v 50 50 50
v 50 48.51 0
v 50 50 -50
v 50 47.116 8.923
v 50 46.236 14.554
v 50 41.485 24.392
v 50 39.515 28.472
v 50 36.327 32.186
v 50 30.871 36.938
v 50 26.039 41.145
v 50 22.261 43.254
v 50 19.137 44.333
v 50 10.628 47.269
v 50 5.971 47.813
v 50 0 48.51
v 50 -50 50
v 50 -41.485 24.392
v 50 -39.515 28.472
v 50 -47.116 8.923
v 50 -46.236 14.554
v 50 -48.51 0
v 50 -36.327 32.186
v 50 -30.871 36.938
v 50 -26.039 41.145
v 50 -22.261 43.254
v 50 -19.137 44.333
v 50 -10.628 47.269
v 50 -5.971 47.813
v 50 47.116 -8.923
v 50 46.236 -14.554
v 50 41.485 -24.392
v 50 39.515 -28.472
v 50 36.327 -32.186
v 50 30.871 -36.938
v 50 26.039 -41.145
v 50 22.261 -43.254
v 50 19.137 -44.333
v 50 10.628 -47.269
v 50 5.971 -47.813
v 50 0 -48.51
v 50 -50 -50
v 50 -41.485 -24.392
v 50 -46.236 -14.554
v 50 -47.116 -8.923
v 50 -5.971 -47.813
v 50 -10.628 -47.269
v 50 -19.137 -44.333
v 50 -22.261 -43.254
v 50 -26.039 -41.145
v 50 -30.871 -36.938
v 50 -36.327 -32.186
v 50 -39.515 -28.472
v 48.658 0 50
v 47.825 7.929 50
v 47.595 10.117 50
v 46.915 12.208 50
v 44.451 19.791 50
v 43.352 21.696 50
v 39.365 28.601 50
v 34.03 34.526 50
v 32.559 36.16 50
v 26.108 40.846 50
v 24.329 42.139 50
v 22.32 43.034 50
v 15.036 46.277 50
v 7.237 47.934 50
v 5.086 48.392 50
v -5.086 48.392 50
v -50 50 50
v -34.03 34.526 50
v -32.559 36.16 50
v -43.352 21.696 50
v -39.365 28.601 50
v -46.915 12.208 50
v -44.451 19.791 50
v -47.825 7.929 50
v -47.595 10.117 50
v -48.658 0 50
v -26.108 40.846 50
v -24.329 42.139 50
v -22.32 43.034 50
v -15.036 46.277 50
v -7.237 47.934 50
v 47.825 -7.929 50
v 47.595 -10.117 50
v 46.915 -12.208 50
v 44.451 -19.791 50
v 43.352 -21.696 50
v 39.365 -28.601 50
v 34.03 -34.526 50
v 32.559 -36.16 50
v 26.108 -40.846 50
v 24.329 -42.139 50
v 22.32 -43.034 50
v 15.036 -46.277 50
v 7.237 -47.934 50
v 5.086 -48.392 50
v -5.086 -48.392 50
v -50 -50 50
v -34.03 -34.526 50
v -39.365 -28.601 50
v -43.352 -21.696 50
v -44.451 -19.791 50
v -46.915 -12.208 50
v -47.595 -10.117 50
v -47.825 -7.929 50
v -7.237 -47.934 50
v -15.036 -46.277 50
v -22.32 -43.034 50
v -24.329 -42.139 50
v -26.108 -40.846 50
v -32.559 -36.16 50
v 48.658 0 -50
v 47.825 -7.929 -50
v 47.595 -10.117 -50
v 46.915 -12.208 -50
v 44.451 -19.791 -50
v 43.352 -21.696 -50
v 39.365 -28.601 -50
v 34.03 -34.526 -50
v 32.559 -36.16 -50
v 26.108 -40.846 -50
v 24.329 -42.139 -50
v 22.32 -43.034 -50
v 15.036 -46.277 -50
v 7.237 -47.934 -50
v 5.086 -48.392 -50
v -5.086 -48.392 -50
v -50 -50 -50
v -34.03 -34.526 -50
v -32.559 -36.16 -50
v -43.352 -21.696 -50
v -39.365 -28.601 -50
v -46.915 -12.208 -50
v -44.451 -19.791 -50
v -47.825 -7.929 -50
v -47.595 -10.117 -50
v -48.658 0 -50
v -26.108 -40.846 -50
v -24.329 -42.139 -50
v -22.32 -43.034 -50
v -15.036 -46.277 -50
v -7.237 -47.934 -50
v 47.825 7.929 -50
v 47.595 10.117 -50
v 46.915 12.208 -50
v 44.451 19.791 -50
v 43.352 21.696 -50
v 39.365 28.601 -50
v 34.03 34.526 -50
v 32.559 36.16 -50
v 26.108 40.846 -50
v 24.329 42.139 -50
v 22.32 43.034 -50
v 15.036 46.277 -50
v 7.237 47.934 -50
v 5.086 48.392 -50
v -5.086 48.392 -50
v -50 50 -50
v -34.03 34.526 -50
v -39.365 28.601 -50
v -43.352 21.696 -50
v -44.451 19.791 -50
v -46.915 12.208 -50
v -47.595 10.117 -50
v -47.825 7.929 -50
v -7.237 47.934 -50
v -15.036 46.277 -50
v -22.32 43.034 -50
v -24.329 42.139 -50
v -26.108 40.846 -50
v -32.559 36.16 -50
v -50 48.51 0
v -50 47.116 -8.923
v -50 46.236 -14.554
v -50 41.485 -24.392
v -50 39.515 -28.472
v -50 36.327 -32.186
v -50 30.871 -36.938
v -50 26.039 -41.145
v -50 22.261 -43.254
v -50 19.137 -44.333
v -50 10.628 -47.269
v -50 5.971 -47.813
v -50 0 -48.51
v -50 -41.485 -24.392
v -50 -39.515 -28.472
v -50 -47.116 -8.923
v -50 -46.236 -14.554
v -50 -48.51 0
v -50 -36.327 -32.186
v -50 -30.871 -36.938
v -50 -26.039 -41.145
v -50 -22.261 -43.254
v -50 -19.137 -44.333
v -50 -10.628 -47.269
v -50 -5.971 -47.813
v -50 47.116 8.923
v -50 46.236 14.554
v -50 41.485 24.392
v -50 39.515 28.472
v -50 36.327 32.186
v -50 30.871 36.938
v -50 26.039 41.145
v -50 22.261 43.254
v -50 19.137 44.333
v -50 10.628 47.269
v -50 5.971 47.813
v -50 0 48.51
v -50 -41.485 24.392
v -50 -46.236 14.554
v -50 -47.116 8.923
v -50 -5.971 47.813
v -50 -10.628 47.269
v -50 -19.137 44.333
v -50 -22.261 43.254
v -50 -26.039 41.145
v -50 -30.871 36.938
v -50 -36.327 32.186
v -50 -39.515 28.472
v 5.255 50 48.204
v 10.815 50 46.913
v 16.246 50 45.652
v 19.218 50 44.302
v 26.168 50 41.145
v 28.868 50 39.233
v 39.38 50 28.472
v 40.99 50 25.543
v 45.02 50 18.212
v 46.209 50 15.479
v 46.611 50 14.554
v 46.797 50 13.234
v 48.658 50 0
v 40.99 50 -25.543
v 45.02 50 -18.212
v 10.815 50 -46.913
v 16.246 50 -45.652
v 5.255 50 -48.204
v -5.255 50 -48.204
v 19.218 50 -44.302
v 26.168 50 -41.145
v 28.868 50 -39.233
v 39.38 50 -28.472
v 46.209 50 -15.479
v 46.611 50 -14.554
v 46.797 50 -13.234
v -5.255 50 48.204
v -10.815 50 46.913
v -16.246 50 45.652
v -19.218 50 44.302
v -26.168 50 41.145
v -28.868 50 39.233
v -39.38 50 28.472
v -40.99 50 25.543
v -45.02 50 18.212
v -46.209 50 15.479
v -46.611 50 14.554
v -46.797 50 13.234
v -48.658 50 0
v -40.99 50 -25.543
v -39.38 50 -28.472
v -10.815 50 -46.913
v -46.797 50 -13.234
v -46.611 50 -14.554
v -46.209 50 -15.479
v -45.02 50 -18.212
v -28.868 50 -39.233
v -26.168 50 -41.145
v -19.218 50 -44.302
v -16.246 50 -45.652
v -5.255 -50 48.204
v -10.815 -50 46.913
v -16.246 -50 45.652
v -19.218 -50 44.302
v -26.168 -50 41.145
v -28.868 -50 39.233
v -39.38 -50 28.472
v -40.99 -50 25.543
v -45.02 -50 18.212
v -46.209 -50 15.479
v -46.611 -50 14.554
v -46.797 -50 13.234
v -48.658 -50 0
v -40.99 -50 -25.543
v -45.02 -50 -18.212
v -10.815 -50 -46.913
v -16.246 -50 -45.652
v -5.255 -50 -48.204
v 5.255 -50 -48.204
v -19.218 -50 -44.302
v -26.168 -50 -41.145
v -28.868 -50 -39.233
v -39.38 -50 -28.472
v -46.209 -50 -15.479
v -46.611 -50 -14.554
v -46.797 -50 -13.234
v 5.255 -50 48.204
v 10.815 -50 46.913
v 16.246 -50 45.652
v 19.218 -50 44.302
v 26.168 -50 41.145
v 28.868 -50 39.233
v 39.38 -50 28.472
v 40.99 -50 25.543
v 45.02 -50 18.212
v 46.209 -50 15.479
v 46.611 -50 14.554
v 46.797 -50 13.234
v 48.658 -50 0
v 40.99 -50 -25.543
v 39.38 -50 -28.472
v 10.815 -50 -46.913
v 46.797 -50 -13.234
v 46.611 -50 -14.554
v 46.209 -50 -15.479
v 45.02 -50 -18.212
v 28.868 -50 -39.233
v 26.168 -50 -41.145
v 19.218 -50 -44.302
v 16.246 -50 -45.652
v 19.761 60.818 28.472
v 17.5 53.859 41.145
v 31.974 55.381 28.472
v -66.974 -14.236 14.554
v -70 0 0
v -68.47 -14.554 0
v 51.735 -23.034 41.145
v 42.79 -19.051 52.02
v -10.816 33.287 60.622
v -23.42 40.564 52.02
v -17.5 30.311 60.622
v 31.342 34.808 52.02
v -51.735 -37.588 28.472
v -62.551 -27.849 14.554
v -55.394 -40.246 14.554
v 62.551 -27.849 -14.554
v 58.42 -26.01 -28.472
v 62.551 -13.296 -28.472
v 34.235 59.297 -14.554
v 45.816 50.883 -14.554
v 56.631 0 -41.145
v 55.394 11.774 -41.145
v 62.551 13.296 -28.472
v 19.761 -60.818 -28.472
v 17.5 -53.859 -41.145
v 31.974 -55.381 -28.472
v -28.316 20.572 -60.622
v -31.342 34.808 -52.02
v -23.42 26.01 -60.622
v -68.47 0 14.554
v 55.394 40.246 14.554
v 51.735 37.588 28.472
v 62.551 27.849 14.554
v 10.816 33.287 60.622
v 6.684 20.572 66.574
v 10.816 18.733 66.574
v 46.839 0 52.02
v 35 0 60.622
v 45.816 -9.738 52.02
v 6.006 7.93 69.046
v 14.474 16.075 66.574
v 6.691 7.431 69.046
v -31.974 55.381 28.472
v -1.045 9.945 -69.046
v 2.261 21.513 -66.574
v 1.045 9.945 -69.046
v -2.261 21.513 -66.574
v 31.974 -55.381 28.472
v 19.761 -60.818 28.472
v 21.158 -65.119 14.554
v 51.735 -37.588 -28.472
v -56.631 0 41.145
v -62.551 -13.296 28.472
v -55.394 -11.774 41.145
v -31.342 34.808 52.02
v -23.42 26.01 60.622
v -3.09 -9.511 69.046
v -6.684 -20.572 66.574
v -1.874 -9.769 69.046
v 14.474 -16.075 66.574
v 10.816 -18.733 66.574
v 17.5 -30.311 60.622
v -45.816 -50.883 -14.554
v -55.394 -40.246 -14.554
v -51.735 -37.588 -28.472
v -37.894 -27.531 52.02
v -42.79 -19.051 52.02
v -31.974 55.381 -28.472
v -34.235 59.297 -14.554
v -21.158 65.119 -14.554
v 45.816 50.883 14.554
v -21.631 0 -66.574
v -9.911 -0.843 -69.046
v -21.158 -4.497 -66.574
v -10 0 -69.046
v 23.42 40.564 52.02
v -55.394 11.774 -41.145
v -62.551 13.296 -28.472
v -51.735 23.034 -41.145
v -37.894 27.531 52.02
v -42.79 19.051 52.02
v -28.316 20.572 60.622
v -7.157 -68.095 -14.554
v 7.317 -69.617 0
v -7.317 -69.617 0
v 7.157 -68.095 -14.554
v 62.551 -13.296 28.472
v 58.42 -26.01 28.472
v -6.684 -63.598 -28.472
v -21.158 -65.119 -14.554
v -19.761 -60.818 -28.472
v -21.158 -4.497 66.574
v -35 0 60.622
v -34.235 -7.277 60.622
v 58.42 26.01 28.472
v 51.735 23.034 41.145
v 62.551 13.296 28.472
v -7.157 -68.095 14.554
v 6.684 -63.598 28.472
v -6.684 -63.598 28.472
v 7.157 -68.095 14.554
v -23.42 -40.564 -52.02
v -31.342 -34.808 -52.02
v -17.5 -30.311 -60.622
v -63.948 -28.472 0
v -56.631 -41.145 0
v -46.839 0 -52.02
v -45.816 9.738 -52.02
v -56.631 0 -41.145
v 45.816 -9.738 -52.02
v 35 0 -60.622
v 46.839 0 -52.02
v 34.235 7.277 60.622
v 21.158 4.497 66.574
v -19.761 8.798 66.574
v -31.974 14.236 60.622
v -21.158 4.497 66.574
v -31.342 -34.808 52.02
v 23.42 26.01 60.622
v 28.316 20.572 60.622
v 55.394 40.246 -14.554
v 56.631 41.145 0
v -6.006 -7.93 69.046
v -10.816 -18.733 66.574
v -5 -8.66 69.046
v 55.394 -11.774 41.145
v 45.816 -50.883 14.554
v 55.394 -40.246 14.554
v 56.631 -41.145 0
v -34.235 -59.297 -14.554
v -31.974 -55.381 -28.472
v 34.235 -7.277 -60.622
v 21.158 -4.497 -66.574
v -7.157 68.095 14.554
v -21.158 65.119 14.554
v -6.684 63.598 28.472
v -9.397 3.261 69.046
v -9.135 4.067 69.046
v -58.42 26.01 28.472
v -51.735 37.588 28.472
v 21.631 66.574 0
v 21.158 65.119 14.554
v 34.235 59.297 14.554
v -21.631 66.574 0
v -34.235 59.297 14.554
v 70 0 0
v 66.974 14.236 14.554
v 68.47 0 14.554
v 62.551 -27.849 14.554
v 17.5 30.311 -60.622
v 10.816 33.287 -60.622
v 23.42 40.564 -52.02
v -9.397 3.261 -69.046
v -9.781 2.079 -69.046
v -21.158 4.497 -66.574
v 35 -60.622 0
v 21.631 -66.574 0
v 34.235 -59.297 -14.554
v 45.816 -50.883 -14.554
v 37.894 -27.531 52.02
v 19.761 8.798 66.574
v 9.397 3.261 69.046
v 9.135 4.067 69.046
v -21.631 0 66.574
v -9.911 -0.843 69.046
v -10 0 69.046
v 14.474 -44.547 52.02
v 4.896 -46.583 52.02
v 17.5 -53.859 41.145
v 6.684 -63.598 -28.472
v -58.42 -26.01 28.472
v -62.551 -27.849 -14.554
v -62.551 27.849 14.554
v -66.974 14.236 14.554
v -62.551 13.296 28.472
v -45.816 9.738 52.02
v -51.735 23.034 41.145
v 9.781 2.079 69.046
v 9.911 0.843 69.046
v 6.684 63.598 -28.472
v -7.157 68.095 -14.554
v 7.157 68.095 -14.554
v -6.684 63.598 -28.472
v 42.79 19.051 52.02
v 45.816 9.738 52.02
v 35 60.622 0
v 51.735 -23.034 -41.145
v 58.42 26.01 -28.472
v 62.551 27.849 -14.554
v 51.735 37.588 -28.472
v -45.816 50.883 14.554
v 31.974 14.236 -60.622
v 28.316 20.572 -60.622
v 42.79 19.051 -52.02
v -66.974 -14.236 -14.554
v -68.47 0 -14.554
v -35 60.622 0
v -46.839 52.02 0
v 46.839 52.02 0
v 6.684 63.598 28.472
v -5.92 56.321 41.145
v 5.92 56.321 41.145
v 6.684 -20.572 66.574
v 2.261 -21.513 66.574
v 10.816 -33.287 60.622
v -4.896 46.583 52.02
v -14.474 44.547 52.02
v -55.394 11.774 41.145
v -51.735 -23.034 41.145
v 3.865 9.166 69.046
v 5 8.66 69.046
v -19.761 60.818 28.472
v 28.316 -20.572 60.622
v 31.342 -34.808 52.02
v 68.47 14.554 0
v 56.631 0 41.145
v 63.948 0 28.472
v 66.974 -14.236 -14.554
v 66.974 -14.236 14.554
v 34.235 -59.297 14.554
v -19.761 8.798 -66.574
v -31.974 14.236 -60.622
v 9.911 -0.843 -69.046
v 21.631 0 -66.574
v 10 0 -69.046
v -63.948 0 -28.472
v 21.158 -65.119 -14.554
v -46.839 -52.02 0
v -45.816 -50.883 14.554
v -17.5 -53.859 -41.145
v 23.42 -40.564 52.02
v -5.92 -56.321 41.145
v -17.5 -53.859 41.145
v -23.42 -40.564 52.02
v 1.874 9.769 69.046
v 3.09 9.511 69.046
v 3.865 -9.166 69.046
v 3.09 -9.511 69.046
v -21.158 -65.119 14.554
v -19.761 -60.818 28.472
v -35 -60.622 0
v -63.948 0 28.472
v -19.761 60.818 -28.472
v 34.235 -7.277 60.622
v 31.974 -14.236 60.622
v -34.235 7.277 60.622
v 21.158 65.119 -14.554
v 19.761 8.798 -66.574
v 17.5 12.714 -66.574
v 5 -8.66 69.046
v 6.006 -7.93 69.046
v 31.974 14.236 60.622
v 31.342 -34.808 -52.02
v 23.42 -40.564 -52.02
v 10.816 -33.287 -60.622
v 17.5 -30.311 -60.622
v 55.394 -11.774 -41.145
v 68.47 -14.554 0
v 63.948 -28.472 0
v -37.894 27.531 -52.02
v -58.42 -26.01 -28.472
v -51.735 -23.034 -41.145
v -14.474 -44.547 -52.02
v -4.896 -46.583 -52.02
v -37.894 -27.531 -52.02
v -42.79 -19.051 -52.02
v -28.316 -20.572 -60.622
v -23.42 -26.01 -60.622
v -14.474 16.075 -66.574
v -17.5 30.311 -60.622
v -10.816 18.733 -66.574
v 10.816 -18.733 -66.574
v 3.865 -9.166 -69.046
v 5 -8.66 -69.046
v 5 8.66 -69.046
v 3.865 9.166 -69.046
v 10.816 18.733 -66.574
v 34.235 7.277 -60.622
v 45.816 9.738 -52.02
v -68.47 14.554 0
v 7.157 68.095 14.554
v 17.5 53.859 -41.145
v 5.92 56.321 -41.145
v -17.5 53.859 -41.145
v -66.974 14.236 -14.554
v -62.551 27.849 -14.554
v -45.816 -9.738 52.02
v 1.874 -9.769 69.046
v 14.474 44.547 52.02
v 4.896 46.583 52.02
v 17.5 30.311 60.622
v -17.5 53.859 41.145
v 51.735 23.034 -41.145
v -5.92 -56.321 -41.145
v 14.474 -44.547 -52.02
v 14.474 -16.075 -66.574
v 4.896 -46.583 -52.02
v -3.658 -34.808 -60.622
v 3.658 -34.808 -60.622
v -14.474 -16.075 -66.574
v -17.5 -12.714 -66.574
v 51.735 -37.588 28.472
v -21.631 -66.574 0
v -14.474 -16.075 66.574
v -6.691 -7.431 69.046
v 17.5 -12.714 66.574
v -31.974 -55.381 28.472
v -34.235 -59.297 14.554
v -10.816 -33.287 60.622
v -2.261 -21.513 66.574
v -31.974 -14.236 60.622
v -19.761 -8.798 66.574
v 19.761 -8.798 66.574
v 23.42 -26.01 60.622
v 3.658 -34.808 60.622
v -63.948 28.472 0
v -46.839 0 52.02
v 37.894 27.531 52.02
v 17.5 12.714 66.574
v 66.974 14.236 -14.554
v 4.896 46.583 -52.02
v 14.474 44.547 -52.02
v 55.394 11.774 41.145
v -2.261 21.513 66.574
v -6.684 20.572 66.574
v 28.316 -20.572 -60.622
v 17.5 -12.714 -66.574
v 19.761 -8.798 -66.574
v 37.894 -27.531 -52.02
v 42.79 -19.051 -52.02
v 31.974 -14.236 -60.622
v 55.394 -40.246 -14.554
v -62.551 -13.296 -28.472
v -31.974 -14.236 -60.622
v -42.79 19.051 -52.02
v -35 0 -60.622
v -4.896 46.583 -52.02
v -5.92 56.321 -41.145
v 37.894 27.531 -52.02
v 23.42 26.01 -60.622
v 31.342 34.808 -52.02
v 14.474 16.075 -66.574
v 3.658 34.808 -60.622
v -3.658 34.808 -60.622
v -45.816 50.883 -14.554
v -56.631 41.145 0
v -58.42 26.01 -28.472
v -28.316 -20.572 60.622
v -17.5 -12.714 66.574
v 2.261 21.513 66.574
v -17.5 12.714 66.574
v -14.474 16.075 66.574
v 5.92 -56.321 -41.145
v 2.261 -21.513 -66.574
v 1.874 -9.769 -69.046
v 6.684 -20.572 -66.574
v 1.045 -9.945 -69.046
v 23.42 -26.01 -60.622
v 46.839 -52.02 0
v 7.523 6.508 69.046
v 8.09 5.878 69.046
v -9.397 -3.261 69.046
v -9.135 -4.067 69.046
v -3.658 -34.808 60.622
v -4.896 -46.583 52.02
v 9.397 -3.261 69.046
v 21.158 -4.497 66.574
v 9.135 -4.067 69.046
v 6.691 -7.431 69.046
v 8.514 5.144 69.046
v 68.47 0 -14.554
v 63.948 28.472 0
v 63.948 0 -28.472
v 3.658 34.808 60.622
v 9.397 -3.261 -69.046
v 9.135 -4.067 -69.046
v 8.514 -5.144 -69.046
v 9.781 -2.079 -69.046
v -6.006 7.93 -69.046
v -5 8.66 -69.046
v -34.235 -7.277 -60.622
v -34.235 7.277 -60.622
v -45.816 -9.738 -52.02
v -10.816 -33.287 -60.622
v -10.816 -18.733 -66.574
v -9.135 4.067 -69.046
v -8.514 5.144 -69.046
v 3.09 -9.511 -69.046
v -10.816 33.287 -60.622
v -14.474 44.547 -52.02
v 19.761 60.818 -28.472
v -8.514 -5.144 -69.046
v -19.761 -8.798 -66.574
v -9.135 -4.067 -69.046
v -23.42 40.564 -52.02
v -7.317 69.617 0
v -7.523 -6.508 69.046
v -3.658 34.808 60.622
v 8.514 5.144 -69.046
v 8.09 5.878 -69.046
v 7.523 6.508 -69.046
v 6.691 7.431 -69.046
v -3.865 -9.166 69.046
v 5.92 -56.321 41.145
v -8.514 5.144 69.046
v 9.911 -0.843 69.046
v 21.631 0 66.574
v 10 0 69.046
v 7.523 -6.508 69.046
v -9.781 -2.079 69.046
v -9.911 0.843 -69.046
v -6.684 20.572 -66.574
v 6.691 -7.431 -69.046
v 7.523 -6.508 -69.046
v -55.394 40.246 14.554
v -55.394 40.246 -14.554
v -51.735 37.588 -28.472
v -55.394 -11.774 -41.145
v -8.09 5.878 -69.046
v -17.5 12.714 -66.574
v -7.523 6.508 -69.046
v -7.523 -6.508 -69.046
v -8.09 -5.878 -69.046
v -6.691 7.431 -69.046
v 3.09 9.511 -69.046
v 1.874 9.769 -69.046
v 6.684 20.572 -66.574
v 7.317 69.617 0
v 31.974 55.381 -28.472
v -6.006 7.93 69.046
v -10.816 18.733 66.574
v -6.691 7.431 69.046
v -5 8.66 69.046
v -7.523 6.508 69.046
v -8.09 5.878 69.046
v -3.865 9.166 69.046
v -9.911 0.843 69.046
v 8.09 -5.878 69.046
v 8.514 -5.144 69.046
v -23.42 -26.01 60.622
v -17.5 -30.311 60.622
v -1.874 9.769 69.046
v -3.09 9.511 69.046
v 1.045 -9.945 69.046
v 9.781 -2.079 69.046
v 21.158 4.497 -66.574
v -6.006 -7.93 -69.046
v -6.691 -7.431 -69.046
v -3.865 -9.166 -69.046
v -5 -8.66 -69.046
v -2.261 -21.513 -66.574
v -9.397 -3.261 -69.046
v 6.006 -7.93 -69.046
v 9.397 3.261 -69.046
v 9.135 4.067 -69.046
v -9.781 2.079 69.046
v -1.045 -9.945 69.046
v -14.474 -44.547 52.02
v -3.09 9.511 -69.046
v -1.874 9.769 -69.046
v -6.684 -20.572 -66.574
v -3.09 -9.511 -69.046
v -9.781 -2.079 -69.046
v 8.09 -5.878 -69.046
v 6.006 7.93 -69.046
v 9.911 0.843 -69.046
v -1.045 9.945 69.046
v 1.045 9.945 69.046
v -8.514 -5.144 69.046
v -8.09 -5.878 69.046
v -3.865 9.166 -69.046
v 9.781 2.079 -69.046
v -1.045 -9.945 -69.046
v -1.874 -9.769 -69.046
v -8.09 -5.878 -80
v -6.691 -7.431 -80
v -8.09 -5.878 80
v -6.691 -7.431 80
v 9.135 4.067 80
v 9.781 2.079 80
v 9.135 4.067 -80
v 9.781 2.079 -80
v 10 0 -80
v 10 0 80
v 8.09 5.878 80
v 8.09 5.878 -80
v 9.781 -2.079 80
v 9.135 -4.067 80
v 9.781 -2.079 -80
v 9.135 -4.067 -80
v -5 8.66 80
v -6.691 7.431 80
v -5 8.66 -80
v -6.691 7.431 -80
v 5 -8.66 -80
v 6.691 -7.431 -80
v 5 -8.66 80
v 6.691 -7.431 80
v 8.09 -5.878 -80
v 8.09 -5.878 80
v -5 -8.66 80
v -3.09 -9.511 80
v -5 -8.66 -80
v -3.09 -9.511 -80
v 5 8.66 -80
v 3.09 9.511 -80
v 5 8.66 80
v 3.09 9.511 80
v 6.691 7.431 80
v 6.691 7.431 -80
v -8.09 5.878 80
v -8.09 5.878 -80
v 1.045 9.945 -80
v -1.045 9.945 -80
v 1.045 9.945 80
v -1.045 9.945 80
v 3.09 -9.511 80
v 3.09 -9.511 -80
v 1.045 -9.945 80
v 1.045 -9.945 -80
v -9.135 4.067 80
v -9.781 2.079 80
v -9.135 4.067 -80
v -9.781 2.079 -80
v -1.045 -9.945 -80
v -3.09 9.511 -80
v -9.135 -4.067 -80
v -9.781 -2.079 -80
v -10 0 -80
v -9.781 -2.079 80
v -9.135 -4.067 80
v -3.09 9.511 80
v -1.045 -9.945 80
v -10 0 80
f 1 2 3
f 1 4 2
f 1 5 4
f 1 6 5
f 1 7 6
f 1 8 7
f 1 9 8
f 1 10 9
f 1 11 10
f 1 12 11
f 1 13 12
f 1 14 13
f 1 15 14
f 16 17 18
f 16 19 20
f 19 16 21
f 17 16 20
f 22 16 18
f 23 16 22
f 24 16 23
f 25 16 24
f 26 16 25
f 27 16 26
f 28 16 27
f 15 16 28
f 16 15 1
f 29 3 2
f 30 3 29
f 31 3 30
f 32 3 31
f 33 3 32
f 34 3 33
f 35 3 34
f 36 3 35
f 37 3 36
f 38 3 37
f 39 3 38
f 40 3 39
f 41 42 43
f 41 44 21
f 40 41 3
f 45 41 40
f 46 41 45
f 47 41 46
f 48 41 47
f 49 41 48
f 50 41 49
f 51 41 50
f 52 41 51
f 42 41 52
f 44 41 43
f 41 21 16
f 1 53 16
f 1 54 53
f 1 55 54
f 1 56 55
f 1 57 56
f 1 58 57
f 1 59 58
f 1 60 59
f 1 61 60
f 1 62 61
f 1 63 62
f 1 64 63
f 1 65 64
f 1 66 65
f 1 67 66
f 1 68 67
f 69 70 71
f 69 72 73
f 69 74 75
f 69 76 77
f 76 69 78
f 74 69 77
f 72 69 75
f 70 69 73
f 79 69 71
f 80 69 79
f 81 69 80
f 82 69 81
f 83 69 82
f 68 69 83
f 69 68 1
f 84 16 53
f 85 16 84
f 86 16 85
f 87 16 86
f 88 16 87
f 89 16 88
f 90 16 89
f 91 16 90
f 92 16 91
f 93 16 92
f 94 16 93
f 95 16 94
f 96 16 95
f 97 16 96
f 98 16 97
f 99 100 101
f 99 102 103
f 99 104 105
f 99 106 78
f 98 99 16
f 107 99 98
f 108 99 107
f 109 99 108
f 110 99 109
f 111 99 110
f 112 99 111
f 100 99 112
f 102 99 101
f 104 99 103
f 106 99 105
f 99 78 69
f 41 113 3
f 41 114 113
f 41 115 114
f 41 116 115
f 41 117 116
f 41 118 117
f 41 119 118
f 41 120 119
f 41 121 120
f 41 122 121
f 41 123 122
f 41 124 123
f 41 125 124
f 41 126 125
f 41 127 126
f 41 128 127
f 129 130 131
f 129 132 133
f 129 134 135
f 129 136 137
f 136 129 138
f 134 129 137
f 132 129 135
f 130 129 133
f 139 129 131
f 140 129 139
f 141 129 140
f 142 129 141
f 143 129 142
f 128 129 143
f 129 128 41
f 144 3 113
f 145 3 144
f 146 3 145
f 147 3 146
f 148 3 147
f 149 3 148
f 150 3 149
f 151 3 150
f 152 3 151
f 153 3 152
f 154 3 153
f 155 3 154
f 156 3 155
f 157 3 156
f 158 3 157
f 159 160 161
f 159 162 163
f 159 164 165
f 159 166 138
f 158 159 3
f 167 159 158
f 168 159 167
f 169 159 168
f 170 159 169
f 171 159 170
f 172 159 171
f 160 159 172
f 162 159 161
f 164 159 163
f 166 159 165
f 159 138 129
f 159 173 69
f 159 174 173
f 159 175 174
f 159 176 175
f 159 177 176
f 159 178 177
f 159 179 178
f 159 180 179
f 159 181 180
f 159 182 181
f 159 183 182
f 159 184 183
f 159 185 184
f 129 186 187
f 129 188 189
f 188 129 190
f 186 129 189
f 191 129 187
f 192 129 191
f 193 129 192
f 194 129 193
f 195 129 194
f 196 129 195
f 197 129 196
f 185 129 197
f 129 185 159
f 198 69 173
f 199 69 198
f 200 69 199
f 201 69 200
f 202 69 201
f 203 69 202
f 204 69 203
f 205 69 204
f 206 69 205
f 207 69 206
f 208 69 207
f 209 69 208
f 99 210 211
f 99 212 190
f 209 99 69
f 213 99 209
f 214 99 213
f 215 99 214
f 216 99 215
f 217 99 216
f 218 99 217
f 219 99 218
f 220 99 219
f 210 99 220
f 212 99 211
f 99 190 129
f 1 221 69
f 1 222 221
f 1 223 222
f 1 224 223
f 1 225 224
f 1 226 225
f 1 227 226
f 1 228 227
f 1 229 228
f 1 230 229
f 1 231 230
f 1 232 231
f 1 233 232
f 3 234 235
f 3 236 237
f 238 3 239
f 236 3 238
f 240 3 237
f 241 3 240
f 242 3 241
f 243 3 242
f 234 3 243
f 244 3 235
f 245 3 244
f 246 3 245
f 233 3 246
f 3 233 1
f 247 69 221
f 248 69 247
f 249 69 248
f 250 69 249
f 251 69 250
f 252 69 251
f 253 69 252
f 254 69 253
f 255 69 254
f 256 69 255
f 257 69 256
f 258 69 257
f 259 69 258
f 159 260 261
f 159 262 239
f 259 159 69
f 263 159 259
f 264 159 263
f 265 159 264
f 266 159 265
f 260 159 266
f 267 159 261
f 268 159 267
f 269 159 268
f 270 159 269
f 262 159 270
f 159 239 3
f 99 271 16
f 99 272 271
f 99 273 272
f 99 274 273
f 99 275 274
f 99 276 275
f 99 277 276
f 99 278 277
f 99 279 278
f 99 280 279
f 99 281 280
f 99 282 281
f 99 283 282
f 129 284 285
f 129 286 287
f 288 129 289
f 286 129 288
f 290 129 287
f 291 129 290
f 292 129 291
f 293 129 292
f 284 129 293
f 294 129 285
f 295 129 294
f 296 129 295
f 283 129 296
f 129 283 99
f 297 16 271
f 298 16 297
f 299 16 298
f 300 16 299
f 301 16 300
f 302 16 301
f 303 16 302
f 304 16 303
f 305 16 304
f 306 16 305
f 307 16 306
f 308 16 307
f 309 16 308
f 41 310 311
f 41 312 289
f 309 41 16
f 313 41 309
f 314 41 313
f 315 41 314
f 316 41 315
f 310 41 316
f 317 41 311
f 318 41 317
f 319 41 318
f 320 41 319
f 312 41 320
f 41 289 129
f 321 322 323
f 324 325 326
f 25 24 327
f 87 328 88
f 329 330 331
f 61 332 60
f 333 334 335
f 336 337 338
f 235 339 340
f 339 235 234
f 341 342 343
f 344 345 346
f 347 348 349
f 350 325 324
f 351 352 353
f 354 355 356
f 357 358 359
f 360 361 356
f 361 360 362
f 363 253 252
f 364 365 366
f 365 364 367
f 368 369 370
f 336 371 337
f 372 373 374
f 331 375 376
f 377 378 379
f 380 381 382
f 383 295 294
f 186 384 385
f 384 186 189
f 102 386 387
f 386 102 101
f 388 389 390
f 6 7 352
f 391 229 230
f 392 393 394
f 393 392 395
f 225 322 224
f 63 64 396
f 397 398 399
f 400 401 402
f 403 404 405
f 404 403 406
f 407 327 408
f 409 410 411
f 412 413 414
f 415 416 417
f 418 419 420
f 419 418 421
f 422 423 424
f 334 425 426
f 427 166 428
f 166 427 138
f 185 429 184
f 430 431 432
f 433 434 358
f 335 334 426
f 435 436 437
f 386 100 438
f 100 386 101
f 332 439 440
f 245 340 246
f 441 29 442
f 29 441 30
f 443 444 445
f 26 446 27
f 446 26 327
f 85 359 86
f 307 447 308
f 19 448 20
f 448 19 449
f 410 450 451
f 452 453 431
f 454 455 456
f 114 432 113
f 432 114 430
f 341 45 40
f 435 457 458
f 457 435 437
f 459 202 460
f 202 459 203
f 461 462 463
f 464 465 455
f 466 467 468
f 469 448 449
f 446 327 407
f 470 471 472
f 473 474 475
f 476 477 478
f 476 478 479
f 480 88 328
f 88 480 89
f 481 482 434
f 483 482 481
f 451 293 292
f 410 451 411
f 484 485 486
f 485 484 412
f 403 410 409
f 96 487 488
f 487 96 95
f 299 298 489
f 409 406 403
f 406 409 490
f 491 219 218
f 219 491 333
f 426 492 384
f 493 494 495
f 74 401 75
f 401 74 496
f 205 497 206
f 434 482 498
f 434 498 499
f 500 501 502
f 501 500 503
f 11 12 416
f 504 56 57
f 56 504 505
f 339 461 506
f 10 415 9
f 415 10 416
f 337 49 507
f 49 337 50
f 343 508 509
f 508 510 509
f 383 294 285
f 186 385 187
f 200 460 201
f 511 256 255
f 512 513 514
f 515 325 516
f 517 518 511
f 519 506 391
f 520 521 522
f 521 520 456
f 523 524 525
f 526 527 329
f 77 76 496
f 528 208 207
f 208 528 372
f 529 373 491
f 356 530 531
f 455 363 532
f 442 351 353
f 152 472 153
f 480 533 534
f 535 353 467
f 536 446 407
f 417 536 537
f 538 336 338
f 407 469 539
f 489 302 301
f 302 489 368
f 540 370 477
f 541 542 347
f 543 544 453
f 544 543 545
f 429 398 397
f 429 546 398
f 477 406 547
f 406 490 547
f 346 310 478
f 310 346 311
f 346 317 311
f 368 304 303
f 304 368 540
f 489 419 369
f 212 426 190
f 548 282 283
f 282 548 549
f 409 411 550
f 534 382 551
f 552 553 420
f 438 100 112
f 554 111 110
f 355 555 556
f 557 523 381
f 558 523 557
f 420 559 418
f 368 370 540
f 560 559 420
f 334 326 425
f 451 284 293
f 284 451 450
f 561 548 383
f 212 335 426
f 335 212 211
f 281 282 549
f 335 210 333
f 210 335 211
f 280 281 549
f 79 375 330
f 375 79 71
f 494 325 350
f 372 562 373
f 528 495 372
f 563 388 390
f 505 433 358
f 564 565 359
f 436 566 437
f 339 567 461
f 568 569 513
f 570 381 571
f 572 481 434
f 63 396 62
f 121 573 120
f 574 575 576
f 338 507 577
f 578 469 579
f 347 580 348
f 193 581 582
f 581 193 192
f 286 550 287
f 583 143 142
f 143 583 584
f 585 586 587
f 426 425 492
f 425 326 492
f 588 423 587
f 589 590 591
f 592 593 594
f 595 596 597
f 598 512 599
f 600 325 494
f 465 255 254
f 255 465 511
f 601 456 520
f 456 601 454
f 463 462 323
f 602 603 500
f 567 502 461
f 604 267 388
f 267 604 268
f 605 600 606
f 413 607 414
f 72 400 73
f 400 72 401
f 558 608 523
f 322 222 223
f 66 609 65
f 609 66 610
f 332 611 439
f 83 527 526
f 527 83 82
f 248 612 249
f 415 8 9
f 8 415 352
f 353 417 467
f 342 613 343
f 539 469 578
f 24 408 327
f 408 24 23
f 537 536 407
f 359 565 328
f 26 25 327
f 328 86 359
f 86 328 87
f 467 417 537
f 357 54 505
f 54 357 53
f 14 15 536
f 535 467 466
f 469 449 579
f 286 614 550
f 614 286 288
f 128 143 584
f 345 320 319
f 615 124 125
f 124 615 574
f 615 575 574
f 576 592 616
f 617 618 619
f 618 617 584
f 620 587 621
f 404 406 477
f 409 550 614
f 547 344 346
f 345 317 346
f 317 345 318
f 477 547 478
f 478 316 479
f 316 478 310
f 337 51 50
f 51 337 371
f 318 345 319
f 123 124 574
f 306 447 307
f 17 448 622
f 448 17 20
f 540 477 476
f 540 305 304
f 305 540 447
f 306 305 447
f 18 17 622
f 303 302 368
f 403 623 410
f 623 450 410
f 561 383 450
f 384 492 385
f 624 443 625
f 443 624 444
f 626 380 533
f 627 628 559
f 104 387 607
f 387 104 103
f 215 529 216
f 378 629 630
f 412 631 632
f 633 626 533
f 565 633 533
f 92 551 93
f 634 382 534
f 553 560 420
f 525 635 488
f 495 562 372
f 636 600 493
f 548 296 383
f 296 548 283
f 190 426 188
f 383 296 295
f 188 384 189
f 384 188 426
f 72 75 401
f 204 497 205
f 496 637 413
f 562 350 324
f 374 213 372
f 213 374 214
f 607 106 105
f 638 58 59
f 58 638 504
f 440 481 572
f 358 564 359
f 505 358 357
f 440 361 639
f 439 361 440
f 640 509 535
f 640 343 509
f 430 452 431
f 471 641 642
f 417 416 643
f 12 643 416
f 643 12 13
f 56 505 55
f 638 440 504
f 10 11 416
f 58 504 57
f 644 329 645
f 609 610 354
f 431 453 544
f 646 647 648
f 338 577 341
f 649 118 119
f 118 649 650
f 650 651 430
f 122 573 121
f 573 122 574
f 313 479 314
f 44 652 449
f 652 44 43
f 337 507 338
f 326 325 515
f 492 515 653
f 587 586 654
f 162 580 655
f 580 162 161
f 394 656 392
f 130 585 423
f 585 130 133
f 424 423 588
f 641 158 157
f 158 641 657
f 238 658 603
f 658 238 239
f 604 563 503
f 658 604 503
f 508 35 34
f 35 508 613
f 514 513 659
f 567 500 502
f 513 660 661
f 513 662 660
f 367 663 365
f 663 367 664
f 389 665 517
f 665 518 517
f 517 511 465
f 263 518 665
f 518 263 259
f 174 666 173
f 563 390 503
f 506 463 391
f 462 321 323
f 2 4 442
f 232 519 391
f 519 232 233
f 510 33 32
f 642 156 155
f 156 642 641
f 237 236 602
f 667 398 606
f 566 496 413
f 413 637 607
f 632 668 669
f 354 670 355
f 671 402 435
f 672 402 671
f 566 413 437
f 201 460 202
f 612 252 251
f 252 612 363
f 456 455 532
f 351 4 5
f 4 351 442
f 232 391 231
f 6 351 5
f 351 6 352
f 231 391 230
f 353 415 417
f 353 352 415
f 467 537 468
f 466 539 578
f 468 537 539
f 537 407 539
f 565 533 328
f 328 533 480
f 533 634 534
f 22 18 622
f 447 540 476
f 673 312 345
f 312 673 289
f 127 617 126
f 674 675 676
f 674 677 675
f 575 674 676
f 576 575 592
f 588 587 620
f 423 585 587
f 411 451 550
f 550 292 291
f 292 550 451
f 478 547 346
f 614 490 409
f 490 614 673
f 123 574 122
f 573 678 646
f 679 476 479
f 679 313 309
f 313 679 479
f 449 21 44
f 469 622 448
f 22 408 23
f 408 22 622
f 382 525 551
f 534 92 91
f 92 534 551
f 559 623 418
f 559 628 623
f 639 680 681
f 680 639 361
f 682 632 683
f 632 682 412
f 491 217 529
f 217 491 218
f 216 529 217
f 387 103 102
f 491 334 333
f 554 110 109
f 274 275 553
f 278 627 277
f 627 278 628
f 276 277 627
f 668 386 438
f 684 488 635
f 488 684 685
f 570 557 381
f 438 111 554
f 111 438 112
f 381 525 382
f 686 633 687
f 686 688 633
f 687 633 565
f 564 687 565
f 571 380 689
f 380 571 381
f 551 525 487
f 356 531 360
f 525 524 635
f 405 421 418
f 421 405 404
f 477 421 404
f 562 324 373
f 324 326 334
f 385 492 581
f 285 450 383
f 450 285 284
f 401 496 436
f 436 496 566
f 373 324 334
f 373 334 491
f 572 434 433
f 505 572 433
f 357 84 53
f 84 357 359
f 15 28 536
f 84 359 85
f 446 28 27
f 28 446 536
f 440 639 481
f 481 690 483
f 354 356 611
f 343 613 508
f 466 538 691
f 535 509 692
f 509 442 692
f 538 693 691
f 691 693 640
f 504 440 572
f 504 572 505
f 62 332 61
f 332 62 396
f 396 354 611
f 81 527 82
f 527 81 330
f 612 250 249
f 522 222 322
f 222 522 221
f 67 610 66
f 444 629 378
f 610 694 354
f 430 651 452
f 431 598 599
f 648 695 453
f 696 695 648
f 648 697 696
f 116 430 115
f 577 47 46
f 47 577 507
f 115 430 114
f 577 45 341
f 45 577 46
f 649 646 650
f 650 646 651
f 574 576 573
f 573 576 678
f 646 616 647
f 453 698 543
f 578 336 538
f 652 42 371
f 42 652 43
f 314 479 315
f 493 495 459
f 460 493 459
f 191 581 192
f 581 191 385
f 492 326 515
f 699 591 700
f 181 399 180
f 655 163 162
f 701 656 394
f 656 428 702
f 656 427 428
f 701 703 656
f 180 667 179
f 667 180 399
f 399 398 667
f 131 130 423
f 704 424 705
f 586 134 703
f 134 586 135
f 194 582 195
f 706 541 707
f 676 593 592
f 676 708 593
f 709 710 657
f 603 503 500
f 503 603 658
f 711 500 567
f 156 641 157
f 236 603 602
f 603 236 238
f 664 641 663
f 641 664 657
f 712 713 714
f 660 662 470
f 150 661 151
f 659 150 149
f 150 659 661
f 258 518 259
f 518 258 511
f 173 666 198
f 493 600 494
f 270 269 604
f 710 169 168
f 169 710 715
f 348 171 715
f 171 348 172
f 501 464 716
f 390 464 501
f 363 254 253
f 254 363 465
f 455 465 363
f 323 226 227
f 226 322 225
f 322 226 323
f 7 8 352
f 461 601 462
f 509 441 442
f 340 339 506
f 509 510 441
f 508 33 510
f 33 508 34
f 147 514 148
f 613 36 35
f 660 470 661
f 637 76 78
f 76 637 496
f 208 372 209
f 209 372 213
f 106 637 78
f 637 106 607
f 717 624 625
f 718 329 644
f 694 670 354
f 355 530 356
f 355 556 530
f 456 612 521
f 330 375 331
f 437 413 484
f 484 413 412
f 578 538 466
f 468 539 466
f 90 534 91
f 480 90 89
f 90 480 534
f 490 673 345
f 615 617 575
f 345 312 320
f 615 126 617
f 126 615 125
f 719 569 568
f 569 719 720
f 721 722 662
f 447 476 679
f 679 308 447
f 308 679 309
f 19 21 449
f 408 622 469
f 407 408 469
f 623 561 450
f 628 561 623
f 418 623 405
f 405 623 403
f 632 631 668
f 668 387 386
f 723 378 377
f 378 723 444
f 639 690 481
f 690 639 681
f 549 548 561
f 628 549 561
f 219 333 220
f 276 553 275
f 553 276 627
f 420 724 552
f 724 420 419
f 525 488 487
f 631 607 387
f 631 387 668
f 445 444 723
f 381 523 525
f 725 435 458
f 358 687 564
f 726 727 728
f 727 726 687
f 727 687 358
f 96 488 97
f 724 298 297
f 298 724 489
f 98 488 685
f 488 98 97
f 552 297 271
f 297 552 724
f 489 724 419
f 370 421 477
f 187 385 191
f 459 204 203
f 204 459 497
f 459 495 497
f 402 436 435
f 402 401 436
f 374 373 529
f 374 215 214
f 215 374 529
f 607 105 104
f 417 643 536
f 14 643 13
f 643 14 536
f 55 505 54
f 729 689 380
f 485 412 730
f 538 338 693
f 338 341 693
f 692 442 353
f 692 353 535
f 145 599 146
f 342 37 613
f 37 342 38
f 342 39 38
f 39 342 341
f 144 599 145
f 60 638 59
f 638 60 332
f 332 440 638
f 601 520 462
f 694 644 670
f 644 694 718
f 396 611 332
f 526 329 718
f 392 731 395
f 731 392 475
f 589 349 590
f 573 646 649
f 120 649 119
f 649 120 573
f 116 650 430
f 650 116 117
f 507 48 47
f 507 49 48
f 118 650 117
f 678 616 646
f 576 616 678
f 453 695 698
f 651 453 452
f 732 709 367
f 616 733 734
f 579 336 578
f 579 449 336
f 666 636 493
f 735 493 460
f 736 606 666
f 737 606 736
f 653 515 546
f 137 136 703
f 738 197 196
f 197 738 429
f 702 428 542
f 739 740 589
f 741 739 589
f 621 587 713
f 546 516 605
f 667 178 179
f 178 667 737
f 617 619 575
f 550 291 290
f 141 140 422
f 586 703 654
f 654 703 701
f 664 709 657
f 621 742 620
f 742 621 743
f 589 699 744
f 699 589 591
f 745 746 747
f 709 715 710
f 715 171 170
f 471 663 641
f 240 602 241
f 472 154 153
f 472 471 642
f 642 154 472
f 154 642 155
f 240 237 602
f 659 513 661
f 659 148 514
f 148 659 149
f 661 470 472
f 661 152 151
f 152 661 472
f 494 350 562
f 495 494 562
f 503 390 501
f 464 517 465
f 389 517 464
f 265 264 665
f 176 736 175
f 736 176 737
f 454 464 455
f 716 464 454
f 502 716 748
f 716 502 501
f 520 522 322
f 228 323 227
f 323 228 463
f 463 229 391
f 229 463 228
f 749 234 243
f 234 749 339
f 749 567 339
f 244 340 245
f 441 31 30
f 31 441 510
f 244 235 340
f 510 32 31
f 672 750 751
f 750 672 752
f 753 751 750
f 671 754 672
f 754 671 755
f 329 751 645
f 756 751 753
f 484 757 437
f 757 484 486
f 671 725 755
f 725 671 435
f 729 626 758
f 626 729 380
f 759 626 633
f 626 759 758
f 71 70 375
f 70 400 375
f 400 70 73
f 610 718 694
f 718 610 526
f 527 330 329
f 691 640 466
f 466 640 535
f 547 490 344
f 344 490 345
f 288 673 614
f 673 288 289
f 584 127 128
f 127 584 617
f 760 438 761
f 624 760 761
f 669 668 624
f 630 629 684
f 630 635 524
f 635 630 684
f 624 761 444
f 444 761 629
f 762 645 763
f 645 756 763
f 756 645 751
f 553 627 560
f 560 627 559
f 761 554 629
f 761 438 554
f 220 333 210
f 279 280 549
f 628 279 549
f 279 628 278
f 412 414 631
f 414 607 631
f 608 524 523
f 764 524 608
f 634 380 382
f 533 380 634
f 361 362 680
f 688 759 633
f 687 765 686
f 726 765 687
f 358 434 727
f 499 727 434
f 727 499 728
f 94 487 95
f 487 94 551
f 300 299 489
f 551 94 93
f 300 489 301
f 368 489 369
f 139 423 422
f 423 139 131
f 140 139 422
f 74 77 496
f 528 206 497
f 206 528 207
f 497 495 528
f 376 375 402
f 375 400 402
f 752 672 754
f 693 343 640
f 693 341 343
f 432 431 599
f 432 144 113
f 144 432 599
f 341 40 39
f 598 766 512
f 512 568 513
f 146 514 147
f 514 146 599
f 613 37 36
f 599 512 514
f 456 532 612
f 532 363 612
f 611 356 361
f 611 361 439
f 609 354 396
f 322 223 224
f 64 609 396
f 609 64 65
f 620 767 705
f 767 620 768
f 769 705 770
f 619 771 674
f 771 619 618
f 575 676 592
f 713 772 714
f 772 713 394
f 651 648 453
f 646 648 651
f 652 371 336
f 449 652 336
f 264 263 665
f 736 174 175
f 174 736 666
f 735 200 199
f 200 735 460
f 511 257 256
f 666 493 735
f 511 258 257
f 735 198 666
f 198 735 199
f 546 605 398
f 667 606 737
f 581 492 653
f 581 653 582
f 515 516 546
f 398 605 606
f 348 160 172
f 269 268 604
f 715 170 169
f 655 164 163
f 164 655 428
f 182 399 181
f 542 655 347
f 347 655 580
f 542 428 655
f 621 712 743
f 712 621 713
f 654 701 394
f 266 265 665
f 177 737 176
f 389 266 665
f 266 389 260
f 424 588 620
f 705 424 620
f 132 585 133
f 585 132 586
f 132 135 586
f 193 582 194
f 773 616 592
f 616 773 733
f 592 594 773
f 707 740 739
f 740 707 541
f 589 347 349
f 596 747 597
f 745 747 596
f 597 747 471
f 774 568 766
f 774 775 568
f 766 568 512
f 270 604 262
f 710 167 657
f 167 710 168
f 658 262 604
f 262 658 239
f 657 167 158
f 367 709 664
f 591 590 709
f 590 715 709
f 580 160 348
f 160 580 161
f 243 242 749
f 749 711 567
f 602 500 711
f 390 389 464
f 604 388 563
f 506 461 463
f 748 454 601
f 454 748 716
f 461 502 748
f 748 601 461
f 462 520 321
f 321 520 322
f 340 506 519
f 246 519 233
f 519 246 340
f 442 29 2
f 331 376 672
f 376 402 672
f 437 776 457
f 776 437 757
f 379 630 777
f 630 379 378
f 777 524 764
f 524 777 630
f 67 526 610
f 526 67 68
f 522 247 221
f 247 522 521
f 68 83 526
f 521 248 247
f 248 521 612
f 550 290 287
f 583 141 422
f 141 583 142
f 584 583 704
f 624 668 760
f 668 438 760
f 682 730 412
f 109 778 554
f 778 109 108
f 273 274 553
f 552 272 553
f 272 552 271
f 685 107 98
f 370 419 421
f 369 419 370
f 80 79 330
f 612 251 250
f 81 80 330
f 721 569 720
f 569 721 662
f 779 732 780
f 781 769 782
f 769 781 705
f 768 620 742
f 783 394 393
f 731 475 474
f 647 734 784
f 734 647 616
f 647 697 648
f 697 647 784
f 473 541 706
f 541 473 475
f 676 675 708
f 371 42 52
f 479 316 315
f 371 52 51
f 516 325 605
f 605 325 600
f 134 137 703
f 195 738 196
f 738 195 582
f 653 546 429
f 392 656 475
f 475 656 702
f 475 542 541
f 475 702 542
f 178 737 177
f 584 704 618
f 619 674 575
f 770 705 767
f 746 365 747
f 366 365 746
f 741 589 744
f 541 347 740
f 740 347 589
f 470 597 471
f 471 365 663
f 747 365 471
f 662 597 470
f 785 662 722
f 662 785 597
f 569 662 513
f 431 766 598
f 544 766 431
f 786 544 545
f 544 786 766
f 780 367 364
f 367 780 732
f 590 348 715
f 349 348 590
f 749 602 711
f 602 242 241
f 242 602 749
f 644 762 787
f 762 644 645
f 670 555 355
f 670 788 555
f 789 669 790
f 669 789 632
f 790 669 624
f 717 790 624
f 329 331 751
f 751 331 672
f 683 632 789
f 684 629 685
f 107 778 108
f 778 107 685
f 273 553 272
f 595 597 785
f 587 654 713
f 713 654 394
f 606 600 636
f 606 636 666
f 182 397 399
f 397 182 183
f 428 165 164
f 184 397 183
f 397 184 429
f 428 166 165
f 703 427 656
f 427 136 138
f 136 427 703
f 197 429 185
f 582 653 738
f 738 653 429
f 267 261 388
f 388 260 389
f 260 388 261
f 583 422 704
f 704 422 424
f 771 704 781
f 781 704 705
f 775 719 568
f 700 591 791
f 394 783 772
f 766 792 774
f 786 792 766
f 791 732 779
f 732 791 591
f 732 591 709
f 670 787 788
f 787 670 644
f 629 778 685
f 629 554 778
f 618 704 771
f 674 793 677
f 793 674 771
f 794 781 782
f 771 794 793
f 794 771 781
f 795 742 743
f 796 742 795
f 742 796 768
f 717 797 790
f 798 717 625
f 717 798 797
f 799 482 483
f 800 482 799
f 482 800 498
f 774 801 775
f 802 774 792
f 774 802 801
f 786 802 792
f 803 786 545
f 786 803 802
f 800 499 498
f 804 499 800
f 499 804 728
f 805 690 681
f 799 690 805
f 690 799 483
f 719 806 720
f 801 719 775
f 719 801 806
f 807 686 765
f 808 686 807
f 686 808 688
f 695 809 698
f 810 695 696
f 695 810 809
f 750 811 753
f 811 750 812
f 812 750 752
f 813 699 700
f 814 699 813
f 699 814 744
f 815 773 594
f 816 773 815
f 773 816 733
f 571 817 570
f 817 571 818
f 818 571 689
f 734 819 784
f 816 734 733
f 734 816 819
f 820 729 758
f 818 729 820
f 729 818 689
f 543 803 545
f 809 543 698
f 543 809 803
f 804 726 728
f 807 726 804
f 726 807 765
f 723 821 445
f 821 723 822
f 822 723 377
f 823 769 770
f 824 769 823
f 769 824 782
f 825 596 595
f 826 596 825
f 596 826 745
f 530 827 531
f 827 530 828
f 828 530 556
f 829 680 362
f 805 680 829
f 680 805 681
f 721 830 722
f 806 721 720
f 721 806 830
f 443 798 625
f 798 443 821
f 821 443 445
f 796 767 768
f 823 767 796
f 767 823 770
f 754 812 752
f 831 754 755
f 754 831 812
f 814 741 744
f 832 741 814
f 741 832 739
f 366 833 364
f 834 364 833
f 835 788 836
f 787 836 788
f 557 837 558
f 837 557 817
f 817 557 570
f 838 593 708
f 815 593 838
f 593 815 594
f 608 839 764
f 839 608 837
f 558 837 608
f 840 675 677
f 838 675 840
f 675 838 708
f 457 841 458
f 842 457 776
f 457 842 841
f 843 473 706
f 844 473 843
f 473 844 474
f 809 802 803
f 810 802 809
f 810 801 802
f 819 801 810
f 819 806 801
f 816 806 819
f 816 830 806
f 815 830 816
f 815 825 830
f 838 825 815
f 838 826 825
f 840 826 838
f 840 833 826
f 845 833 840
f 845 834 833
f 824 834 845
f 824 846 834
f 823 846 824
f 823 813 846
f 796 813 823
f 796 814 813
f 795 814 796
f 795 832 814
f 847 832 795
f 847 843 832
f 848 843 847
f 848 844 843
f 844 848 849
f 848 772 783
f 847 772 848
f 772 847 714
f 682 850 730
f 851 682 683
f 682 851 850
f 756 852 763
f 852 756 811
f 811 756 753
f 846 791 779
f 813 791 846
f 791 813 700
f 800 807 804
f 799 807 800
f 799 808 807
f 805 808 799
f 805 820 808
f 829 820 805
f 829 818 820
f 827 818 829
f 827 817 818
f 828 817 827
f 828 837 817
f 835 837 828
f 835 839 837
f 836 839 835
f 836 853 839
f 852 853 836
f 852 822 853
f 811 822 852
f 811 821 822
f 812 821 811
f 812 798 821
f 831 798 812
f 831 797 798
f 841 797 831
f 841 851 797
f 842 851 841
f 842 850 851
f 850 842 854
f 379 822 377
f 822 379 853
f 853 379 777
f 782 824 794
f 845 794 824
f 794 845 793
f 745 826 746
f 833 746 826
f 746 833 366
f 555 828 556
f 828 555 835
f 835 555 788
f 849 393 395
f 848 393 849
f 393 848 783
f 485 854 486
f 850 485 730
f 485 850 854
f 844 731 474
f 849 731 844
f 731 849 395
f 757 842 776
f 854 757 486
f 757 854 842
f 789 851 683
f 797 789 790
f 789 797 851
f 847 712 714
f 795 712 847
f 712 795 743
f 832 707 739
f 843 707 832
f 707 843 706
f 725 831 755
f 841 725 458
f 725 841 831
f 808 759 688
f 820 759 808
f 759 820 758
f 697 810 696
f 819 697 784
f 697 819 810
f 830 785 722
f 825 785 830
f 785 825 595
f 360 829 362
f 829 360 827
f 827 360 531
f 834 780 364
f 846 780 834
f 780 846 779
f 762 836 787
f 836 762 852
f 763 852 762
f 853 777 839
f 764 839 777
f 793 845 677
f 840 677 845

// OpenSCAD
union () {
  cube ([100, 100, 100], center=true);
  sphere (r=70);
  cylinder (h=160, r=10, center=true);
}
